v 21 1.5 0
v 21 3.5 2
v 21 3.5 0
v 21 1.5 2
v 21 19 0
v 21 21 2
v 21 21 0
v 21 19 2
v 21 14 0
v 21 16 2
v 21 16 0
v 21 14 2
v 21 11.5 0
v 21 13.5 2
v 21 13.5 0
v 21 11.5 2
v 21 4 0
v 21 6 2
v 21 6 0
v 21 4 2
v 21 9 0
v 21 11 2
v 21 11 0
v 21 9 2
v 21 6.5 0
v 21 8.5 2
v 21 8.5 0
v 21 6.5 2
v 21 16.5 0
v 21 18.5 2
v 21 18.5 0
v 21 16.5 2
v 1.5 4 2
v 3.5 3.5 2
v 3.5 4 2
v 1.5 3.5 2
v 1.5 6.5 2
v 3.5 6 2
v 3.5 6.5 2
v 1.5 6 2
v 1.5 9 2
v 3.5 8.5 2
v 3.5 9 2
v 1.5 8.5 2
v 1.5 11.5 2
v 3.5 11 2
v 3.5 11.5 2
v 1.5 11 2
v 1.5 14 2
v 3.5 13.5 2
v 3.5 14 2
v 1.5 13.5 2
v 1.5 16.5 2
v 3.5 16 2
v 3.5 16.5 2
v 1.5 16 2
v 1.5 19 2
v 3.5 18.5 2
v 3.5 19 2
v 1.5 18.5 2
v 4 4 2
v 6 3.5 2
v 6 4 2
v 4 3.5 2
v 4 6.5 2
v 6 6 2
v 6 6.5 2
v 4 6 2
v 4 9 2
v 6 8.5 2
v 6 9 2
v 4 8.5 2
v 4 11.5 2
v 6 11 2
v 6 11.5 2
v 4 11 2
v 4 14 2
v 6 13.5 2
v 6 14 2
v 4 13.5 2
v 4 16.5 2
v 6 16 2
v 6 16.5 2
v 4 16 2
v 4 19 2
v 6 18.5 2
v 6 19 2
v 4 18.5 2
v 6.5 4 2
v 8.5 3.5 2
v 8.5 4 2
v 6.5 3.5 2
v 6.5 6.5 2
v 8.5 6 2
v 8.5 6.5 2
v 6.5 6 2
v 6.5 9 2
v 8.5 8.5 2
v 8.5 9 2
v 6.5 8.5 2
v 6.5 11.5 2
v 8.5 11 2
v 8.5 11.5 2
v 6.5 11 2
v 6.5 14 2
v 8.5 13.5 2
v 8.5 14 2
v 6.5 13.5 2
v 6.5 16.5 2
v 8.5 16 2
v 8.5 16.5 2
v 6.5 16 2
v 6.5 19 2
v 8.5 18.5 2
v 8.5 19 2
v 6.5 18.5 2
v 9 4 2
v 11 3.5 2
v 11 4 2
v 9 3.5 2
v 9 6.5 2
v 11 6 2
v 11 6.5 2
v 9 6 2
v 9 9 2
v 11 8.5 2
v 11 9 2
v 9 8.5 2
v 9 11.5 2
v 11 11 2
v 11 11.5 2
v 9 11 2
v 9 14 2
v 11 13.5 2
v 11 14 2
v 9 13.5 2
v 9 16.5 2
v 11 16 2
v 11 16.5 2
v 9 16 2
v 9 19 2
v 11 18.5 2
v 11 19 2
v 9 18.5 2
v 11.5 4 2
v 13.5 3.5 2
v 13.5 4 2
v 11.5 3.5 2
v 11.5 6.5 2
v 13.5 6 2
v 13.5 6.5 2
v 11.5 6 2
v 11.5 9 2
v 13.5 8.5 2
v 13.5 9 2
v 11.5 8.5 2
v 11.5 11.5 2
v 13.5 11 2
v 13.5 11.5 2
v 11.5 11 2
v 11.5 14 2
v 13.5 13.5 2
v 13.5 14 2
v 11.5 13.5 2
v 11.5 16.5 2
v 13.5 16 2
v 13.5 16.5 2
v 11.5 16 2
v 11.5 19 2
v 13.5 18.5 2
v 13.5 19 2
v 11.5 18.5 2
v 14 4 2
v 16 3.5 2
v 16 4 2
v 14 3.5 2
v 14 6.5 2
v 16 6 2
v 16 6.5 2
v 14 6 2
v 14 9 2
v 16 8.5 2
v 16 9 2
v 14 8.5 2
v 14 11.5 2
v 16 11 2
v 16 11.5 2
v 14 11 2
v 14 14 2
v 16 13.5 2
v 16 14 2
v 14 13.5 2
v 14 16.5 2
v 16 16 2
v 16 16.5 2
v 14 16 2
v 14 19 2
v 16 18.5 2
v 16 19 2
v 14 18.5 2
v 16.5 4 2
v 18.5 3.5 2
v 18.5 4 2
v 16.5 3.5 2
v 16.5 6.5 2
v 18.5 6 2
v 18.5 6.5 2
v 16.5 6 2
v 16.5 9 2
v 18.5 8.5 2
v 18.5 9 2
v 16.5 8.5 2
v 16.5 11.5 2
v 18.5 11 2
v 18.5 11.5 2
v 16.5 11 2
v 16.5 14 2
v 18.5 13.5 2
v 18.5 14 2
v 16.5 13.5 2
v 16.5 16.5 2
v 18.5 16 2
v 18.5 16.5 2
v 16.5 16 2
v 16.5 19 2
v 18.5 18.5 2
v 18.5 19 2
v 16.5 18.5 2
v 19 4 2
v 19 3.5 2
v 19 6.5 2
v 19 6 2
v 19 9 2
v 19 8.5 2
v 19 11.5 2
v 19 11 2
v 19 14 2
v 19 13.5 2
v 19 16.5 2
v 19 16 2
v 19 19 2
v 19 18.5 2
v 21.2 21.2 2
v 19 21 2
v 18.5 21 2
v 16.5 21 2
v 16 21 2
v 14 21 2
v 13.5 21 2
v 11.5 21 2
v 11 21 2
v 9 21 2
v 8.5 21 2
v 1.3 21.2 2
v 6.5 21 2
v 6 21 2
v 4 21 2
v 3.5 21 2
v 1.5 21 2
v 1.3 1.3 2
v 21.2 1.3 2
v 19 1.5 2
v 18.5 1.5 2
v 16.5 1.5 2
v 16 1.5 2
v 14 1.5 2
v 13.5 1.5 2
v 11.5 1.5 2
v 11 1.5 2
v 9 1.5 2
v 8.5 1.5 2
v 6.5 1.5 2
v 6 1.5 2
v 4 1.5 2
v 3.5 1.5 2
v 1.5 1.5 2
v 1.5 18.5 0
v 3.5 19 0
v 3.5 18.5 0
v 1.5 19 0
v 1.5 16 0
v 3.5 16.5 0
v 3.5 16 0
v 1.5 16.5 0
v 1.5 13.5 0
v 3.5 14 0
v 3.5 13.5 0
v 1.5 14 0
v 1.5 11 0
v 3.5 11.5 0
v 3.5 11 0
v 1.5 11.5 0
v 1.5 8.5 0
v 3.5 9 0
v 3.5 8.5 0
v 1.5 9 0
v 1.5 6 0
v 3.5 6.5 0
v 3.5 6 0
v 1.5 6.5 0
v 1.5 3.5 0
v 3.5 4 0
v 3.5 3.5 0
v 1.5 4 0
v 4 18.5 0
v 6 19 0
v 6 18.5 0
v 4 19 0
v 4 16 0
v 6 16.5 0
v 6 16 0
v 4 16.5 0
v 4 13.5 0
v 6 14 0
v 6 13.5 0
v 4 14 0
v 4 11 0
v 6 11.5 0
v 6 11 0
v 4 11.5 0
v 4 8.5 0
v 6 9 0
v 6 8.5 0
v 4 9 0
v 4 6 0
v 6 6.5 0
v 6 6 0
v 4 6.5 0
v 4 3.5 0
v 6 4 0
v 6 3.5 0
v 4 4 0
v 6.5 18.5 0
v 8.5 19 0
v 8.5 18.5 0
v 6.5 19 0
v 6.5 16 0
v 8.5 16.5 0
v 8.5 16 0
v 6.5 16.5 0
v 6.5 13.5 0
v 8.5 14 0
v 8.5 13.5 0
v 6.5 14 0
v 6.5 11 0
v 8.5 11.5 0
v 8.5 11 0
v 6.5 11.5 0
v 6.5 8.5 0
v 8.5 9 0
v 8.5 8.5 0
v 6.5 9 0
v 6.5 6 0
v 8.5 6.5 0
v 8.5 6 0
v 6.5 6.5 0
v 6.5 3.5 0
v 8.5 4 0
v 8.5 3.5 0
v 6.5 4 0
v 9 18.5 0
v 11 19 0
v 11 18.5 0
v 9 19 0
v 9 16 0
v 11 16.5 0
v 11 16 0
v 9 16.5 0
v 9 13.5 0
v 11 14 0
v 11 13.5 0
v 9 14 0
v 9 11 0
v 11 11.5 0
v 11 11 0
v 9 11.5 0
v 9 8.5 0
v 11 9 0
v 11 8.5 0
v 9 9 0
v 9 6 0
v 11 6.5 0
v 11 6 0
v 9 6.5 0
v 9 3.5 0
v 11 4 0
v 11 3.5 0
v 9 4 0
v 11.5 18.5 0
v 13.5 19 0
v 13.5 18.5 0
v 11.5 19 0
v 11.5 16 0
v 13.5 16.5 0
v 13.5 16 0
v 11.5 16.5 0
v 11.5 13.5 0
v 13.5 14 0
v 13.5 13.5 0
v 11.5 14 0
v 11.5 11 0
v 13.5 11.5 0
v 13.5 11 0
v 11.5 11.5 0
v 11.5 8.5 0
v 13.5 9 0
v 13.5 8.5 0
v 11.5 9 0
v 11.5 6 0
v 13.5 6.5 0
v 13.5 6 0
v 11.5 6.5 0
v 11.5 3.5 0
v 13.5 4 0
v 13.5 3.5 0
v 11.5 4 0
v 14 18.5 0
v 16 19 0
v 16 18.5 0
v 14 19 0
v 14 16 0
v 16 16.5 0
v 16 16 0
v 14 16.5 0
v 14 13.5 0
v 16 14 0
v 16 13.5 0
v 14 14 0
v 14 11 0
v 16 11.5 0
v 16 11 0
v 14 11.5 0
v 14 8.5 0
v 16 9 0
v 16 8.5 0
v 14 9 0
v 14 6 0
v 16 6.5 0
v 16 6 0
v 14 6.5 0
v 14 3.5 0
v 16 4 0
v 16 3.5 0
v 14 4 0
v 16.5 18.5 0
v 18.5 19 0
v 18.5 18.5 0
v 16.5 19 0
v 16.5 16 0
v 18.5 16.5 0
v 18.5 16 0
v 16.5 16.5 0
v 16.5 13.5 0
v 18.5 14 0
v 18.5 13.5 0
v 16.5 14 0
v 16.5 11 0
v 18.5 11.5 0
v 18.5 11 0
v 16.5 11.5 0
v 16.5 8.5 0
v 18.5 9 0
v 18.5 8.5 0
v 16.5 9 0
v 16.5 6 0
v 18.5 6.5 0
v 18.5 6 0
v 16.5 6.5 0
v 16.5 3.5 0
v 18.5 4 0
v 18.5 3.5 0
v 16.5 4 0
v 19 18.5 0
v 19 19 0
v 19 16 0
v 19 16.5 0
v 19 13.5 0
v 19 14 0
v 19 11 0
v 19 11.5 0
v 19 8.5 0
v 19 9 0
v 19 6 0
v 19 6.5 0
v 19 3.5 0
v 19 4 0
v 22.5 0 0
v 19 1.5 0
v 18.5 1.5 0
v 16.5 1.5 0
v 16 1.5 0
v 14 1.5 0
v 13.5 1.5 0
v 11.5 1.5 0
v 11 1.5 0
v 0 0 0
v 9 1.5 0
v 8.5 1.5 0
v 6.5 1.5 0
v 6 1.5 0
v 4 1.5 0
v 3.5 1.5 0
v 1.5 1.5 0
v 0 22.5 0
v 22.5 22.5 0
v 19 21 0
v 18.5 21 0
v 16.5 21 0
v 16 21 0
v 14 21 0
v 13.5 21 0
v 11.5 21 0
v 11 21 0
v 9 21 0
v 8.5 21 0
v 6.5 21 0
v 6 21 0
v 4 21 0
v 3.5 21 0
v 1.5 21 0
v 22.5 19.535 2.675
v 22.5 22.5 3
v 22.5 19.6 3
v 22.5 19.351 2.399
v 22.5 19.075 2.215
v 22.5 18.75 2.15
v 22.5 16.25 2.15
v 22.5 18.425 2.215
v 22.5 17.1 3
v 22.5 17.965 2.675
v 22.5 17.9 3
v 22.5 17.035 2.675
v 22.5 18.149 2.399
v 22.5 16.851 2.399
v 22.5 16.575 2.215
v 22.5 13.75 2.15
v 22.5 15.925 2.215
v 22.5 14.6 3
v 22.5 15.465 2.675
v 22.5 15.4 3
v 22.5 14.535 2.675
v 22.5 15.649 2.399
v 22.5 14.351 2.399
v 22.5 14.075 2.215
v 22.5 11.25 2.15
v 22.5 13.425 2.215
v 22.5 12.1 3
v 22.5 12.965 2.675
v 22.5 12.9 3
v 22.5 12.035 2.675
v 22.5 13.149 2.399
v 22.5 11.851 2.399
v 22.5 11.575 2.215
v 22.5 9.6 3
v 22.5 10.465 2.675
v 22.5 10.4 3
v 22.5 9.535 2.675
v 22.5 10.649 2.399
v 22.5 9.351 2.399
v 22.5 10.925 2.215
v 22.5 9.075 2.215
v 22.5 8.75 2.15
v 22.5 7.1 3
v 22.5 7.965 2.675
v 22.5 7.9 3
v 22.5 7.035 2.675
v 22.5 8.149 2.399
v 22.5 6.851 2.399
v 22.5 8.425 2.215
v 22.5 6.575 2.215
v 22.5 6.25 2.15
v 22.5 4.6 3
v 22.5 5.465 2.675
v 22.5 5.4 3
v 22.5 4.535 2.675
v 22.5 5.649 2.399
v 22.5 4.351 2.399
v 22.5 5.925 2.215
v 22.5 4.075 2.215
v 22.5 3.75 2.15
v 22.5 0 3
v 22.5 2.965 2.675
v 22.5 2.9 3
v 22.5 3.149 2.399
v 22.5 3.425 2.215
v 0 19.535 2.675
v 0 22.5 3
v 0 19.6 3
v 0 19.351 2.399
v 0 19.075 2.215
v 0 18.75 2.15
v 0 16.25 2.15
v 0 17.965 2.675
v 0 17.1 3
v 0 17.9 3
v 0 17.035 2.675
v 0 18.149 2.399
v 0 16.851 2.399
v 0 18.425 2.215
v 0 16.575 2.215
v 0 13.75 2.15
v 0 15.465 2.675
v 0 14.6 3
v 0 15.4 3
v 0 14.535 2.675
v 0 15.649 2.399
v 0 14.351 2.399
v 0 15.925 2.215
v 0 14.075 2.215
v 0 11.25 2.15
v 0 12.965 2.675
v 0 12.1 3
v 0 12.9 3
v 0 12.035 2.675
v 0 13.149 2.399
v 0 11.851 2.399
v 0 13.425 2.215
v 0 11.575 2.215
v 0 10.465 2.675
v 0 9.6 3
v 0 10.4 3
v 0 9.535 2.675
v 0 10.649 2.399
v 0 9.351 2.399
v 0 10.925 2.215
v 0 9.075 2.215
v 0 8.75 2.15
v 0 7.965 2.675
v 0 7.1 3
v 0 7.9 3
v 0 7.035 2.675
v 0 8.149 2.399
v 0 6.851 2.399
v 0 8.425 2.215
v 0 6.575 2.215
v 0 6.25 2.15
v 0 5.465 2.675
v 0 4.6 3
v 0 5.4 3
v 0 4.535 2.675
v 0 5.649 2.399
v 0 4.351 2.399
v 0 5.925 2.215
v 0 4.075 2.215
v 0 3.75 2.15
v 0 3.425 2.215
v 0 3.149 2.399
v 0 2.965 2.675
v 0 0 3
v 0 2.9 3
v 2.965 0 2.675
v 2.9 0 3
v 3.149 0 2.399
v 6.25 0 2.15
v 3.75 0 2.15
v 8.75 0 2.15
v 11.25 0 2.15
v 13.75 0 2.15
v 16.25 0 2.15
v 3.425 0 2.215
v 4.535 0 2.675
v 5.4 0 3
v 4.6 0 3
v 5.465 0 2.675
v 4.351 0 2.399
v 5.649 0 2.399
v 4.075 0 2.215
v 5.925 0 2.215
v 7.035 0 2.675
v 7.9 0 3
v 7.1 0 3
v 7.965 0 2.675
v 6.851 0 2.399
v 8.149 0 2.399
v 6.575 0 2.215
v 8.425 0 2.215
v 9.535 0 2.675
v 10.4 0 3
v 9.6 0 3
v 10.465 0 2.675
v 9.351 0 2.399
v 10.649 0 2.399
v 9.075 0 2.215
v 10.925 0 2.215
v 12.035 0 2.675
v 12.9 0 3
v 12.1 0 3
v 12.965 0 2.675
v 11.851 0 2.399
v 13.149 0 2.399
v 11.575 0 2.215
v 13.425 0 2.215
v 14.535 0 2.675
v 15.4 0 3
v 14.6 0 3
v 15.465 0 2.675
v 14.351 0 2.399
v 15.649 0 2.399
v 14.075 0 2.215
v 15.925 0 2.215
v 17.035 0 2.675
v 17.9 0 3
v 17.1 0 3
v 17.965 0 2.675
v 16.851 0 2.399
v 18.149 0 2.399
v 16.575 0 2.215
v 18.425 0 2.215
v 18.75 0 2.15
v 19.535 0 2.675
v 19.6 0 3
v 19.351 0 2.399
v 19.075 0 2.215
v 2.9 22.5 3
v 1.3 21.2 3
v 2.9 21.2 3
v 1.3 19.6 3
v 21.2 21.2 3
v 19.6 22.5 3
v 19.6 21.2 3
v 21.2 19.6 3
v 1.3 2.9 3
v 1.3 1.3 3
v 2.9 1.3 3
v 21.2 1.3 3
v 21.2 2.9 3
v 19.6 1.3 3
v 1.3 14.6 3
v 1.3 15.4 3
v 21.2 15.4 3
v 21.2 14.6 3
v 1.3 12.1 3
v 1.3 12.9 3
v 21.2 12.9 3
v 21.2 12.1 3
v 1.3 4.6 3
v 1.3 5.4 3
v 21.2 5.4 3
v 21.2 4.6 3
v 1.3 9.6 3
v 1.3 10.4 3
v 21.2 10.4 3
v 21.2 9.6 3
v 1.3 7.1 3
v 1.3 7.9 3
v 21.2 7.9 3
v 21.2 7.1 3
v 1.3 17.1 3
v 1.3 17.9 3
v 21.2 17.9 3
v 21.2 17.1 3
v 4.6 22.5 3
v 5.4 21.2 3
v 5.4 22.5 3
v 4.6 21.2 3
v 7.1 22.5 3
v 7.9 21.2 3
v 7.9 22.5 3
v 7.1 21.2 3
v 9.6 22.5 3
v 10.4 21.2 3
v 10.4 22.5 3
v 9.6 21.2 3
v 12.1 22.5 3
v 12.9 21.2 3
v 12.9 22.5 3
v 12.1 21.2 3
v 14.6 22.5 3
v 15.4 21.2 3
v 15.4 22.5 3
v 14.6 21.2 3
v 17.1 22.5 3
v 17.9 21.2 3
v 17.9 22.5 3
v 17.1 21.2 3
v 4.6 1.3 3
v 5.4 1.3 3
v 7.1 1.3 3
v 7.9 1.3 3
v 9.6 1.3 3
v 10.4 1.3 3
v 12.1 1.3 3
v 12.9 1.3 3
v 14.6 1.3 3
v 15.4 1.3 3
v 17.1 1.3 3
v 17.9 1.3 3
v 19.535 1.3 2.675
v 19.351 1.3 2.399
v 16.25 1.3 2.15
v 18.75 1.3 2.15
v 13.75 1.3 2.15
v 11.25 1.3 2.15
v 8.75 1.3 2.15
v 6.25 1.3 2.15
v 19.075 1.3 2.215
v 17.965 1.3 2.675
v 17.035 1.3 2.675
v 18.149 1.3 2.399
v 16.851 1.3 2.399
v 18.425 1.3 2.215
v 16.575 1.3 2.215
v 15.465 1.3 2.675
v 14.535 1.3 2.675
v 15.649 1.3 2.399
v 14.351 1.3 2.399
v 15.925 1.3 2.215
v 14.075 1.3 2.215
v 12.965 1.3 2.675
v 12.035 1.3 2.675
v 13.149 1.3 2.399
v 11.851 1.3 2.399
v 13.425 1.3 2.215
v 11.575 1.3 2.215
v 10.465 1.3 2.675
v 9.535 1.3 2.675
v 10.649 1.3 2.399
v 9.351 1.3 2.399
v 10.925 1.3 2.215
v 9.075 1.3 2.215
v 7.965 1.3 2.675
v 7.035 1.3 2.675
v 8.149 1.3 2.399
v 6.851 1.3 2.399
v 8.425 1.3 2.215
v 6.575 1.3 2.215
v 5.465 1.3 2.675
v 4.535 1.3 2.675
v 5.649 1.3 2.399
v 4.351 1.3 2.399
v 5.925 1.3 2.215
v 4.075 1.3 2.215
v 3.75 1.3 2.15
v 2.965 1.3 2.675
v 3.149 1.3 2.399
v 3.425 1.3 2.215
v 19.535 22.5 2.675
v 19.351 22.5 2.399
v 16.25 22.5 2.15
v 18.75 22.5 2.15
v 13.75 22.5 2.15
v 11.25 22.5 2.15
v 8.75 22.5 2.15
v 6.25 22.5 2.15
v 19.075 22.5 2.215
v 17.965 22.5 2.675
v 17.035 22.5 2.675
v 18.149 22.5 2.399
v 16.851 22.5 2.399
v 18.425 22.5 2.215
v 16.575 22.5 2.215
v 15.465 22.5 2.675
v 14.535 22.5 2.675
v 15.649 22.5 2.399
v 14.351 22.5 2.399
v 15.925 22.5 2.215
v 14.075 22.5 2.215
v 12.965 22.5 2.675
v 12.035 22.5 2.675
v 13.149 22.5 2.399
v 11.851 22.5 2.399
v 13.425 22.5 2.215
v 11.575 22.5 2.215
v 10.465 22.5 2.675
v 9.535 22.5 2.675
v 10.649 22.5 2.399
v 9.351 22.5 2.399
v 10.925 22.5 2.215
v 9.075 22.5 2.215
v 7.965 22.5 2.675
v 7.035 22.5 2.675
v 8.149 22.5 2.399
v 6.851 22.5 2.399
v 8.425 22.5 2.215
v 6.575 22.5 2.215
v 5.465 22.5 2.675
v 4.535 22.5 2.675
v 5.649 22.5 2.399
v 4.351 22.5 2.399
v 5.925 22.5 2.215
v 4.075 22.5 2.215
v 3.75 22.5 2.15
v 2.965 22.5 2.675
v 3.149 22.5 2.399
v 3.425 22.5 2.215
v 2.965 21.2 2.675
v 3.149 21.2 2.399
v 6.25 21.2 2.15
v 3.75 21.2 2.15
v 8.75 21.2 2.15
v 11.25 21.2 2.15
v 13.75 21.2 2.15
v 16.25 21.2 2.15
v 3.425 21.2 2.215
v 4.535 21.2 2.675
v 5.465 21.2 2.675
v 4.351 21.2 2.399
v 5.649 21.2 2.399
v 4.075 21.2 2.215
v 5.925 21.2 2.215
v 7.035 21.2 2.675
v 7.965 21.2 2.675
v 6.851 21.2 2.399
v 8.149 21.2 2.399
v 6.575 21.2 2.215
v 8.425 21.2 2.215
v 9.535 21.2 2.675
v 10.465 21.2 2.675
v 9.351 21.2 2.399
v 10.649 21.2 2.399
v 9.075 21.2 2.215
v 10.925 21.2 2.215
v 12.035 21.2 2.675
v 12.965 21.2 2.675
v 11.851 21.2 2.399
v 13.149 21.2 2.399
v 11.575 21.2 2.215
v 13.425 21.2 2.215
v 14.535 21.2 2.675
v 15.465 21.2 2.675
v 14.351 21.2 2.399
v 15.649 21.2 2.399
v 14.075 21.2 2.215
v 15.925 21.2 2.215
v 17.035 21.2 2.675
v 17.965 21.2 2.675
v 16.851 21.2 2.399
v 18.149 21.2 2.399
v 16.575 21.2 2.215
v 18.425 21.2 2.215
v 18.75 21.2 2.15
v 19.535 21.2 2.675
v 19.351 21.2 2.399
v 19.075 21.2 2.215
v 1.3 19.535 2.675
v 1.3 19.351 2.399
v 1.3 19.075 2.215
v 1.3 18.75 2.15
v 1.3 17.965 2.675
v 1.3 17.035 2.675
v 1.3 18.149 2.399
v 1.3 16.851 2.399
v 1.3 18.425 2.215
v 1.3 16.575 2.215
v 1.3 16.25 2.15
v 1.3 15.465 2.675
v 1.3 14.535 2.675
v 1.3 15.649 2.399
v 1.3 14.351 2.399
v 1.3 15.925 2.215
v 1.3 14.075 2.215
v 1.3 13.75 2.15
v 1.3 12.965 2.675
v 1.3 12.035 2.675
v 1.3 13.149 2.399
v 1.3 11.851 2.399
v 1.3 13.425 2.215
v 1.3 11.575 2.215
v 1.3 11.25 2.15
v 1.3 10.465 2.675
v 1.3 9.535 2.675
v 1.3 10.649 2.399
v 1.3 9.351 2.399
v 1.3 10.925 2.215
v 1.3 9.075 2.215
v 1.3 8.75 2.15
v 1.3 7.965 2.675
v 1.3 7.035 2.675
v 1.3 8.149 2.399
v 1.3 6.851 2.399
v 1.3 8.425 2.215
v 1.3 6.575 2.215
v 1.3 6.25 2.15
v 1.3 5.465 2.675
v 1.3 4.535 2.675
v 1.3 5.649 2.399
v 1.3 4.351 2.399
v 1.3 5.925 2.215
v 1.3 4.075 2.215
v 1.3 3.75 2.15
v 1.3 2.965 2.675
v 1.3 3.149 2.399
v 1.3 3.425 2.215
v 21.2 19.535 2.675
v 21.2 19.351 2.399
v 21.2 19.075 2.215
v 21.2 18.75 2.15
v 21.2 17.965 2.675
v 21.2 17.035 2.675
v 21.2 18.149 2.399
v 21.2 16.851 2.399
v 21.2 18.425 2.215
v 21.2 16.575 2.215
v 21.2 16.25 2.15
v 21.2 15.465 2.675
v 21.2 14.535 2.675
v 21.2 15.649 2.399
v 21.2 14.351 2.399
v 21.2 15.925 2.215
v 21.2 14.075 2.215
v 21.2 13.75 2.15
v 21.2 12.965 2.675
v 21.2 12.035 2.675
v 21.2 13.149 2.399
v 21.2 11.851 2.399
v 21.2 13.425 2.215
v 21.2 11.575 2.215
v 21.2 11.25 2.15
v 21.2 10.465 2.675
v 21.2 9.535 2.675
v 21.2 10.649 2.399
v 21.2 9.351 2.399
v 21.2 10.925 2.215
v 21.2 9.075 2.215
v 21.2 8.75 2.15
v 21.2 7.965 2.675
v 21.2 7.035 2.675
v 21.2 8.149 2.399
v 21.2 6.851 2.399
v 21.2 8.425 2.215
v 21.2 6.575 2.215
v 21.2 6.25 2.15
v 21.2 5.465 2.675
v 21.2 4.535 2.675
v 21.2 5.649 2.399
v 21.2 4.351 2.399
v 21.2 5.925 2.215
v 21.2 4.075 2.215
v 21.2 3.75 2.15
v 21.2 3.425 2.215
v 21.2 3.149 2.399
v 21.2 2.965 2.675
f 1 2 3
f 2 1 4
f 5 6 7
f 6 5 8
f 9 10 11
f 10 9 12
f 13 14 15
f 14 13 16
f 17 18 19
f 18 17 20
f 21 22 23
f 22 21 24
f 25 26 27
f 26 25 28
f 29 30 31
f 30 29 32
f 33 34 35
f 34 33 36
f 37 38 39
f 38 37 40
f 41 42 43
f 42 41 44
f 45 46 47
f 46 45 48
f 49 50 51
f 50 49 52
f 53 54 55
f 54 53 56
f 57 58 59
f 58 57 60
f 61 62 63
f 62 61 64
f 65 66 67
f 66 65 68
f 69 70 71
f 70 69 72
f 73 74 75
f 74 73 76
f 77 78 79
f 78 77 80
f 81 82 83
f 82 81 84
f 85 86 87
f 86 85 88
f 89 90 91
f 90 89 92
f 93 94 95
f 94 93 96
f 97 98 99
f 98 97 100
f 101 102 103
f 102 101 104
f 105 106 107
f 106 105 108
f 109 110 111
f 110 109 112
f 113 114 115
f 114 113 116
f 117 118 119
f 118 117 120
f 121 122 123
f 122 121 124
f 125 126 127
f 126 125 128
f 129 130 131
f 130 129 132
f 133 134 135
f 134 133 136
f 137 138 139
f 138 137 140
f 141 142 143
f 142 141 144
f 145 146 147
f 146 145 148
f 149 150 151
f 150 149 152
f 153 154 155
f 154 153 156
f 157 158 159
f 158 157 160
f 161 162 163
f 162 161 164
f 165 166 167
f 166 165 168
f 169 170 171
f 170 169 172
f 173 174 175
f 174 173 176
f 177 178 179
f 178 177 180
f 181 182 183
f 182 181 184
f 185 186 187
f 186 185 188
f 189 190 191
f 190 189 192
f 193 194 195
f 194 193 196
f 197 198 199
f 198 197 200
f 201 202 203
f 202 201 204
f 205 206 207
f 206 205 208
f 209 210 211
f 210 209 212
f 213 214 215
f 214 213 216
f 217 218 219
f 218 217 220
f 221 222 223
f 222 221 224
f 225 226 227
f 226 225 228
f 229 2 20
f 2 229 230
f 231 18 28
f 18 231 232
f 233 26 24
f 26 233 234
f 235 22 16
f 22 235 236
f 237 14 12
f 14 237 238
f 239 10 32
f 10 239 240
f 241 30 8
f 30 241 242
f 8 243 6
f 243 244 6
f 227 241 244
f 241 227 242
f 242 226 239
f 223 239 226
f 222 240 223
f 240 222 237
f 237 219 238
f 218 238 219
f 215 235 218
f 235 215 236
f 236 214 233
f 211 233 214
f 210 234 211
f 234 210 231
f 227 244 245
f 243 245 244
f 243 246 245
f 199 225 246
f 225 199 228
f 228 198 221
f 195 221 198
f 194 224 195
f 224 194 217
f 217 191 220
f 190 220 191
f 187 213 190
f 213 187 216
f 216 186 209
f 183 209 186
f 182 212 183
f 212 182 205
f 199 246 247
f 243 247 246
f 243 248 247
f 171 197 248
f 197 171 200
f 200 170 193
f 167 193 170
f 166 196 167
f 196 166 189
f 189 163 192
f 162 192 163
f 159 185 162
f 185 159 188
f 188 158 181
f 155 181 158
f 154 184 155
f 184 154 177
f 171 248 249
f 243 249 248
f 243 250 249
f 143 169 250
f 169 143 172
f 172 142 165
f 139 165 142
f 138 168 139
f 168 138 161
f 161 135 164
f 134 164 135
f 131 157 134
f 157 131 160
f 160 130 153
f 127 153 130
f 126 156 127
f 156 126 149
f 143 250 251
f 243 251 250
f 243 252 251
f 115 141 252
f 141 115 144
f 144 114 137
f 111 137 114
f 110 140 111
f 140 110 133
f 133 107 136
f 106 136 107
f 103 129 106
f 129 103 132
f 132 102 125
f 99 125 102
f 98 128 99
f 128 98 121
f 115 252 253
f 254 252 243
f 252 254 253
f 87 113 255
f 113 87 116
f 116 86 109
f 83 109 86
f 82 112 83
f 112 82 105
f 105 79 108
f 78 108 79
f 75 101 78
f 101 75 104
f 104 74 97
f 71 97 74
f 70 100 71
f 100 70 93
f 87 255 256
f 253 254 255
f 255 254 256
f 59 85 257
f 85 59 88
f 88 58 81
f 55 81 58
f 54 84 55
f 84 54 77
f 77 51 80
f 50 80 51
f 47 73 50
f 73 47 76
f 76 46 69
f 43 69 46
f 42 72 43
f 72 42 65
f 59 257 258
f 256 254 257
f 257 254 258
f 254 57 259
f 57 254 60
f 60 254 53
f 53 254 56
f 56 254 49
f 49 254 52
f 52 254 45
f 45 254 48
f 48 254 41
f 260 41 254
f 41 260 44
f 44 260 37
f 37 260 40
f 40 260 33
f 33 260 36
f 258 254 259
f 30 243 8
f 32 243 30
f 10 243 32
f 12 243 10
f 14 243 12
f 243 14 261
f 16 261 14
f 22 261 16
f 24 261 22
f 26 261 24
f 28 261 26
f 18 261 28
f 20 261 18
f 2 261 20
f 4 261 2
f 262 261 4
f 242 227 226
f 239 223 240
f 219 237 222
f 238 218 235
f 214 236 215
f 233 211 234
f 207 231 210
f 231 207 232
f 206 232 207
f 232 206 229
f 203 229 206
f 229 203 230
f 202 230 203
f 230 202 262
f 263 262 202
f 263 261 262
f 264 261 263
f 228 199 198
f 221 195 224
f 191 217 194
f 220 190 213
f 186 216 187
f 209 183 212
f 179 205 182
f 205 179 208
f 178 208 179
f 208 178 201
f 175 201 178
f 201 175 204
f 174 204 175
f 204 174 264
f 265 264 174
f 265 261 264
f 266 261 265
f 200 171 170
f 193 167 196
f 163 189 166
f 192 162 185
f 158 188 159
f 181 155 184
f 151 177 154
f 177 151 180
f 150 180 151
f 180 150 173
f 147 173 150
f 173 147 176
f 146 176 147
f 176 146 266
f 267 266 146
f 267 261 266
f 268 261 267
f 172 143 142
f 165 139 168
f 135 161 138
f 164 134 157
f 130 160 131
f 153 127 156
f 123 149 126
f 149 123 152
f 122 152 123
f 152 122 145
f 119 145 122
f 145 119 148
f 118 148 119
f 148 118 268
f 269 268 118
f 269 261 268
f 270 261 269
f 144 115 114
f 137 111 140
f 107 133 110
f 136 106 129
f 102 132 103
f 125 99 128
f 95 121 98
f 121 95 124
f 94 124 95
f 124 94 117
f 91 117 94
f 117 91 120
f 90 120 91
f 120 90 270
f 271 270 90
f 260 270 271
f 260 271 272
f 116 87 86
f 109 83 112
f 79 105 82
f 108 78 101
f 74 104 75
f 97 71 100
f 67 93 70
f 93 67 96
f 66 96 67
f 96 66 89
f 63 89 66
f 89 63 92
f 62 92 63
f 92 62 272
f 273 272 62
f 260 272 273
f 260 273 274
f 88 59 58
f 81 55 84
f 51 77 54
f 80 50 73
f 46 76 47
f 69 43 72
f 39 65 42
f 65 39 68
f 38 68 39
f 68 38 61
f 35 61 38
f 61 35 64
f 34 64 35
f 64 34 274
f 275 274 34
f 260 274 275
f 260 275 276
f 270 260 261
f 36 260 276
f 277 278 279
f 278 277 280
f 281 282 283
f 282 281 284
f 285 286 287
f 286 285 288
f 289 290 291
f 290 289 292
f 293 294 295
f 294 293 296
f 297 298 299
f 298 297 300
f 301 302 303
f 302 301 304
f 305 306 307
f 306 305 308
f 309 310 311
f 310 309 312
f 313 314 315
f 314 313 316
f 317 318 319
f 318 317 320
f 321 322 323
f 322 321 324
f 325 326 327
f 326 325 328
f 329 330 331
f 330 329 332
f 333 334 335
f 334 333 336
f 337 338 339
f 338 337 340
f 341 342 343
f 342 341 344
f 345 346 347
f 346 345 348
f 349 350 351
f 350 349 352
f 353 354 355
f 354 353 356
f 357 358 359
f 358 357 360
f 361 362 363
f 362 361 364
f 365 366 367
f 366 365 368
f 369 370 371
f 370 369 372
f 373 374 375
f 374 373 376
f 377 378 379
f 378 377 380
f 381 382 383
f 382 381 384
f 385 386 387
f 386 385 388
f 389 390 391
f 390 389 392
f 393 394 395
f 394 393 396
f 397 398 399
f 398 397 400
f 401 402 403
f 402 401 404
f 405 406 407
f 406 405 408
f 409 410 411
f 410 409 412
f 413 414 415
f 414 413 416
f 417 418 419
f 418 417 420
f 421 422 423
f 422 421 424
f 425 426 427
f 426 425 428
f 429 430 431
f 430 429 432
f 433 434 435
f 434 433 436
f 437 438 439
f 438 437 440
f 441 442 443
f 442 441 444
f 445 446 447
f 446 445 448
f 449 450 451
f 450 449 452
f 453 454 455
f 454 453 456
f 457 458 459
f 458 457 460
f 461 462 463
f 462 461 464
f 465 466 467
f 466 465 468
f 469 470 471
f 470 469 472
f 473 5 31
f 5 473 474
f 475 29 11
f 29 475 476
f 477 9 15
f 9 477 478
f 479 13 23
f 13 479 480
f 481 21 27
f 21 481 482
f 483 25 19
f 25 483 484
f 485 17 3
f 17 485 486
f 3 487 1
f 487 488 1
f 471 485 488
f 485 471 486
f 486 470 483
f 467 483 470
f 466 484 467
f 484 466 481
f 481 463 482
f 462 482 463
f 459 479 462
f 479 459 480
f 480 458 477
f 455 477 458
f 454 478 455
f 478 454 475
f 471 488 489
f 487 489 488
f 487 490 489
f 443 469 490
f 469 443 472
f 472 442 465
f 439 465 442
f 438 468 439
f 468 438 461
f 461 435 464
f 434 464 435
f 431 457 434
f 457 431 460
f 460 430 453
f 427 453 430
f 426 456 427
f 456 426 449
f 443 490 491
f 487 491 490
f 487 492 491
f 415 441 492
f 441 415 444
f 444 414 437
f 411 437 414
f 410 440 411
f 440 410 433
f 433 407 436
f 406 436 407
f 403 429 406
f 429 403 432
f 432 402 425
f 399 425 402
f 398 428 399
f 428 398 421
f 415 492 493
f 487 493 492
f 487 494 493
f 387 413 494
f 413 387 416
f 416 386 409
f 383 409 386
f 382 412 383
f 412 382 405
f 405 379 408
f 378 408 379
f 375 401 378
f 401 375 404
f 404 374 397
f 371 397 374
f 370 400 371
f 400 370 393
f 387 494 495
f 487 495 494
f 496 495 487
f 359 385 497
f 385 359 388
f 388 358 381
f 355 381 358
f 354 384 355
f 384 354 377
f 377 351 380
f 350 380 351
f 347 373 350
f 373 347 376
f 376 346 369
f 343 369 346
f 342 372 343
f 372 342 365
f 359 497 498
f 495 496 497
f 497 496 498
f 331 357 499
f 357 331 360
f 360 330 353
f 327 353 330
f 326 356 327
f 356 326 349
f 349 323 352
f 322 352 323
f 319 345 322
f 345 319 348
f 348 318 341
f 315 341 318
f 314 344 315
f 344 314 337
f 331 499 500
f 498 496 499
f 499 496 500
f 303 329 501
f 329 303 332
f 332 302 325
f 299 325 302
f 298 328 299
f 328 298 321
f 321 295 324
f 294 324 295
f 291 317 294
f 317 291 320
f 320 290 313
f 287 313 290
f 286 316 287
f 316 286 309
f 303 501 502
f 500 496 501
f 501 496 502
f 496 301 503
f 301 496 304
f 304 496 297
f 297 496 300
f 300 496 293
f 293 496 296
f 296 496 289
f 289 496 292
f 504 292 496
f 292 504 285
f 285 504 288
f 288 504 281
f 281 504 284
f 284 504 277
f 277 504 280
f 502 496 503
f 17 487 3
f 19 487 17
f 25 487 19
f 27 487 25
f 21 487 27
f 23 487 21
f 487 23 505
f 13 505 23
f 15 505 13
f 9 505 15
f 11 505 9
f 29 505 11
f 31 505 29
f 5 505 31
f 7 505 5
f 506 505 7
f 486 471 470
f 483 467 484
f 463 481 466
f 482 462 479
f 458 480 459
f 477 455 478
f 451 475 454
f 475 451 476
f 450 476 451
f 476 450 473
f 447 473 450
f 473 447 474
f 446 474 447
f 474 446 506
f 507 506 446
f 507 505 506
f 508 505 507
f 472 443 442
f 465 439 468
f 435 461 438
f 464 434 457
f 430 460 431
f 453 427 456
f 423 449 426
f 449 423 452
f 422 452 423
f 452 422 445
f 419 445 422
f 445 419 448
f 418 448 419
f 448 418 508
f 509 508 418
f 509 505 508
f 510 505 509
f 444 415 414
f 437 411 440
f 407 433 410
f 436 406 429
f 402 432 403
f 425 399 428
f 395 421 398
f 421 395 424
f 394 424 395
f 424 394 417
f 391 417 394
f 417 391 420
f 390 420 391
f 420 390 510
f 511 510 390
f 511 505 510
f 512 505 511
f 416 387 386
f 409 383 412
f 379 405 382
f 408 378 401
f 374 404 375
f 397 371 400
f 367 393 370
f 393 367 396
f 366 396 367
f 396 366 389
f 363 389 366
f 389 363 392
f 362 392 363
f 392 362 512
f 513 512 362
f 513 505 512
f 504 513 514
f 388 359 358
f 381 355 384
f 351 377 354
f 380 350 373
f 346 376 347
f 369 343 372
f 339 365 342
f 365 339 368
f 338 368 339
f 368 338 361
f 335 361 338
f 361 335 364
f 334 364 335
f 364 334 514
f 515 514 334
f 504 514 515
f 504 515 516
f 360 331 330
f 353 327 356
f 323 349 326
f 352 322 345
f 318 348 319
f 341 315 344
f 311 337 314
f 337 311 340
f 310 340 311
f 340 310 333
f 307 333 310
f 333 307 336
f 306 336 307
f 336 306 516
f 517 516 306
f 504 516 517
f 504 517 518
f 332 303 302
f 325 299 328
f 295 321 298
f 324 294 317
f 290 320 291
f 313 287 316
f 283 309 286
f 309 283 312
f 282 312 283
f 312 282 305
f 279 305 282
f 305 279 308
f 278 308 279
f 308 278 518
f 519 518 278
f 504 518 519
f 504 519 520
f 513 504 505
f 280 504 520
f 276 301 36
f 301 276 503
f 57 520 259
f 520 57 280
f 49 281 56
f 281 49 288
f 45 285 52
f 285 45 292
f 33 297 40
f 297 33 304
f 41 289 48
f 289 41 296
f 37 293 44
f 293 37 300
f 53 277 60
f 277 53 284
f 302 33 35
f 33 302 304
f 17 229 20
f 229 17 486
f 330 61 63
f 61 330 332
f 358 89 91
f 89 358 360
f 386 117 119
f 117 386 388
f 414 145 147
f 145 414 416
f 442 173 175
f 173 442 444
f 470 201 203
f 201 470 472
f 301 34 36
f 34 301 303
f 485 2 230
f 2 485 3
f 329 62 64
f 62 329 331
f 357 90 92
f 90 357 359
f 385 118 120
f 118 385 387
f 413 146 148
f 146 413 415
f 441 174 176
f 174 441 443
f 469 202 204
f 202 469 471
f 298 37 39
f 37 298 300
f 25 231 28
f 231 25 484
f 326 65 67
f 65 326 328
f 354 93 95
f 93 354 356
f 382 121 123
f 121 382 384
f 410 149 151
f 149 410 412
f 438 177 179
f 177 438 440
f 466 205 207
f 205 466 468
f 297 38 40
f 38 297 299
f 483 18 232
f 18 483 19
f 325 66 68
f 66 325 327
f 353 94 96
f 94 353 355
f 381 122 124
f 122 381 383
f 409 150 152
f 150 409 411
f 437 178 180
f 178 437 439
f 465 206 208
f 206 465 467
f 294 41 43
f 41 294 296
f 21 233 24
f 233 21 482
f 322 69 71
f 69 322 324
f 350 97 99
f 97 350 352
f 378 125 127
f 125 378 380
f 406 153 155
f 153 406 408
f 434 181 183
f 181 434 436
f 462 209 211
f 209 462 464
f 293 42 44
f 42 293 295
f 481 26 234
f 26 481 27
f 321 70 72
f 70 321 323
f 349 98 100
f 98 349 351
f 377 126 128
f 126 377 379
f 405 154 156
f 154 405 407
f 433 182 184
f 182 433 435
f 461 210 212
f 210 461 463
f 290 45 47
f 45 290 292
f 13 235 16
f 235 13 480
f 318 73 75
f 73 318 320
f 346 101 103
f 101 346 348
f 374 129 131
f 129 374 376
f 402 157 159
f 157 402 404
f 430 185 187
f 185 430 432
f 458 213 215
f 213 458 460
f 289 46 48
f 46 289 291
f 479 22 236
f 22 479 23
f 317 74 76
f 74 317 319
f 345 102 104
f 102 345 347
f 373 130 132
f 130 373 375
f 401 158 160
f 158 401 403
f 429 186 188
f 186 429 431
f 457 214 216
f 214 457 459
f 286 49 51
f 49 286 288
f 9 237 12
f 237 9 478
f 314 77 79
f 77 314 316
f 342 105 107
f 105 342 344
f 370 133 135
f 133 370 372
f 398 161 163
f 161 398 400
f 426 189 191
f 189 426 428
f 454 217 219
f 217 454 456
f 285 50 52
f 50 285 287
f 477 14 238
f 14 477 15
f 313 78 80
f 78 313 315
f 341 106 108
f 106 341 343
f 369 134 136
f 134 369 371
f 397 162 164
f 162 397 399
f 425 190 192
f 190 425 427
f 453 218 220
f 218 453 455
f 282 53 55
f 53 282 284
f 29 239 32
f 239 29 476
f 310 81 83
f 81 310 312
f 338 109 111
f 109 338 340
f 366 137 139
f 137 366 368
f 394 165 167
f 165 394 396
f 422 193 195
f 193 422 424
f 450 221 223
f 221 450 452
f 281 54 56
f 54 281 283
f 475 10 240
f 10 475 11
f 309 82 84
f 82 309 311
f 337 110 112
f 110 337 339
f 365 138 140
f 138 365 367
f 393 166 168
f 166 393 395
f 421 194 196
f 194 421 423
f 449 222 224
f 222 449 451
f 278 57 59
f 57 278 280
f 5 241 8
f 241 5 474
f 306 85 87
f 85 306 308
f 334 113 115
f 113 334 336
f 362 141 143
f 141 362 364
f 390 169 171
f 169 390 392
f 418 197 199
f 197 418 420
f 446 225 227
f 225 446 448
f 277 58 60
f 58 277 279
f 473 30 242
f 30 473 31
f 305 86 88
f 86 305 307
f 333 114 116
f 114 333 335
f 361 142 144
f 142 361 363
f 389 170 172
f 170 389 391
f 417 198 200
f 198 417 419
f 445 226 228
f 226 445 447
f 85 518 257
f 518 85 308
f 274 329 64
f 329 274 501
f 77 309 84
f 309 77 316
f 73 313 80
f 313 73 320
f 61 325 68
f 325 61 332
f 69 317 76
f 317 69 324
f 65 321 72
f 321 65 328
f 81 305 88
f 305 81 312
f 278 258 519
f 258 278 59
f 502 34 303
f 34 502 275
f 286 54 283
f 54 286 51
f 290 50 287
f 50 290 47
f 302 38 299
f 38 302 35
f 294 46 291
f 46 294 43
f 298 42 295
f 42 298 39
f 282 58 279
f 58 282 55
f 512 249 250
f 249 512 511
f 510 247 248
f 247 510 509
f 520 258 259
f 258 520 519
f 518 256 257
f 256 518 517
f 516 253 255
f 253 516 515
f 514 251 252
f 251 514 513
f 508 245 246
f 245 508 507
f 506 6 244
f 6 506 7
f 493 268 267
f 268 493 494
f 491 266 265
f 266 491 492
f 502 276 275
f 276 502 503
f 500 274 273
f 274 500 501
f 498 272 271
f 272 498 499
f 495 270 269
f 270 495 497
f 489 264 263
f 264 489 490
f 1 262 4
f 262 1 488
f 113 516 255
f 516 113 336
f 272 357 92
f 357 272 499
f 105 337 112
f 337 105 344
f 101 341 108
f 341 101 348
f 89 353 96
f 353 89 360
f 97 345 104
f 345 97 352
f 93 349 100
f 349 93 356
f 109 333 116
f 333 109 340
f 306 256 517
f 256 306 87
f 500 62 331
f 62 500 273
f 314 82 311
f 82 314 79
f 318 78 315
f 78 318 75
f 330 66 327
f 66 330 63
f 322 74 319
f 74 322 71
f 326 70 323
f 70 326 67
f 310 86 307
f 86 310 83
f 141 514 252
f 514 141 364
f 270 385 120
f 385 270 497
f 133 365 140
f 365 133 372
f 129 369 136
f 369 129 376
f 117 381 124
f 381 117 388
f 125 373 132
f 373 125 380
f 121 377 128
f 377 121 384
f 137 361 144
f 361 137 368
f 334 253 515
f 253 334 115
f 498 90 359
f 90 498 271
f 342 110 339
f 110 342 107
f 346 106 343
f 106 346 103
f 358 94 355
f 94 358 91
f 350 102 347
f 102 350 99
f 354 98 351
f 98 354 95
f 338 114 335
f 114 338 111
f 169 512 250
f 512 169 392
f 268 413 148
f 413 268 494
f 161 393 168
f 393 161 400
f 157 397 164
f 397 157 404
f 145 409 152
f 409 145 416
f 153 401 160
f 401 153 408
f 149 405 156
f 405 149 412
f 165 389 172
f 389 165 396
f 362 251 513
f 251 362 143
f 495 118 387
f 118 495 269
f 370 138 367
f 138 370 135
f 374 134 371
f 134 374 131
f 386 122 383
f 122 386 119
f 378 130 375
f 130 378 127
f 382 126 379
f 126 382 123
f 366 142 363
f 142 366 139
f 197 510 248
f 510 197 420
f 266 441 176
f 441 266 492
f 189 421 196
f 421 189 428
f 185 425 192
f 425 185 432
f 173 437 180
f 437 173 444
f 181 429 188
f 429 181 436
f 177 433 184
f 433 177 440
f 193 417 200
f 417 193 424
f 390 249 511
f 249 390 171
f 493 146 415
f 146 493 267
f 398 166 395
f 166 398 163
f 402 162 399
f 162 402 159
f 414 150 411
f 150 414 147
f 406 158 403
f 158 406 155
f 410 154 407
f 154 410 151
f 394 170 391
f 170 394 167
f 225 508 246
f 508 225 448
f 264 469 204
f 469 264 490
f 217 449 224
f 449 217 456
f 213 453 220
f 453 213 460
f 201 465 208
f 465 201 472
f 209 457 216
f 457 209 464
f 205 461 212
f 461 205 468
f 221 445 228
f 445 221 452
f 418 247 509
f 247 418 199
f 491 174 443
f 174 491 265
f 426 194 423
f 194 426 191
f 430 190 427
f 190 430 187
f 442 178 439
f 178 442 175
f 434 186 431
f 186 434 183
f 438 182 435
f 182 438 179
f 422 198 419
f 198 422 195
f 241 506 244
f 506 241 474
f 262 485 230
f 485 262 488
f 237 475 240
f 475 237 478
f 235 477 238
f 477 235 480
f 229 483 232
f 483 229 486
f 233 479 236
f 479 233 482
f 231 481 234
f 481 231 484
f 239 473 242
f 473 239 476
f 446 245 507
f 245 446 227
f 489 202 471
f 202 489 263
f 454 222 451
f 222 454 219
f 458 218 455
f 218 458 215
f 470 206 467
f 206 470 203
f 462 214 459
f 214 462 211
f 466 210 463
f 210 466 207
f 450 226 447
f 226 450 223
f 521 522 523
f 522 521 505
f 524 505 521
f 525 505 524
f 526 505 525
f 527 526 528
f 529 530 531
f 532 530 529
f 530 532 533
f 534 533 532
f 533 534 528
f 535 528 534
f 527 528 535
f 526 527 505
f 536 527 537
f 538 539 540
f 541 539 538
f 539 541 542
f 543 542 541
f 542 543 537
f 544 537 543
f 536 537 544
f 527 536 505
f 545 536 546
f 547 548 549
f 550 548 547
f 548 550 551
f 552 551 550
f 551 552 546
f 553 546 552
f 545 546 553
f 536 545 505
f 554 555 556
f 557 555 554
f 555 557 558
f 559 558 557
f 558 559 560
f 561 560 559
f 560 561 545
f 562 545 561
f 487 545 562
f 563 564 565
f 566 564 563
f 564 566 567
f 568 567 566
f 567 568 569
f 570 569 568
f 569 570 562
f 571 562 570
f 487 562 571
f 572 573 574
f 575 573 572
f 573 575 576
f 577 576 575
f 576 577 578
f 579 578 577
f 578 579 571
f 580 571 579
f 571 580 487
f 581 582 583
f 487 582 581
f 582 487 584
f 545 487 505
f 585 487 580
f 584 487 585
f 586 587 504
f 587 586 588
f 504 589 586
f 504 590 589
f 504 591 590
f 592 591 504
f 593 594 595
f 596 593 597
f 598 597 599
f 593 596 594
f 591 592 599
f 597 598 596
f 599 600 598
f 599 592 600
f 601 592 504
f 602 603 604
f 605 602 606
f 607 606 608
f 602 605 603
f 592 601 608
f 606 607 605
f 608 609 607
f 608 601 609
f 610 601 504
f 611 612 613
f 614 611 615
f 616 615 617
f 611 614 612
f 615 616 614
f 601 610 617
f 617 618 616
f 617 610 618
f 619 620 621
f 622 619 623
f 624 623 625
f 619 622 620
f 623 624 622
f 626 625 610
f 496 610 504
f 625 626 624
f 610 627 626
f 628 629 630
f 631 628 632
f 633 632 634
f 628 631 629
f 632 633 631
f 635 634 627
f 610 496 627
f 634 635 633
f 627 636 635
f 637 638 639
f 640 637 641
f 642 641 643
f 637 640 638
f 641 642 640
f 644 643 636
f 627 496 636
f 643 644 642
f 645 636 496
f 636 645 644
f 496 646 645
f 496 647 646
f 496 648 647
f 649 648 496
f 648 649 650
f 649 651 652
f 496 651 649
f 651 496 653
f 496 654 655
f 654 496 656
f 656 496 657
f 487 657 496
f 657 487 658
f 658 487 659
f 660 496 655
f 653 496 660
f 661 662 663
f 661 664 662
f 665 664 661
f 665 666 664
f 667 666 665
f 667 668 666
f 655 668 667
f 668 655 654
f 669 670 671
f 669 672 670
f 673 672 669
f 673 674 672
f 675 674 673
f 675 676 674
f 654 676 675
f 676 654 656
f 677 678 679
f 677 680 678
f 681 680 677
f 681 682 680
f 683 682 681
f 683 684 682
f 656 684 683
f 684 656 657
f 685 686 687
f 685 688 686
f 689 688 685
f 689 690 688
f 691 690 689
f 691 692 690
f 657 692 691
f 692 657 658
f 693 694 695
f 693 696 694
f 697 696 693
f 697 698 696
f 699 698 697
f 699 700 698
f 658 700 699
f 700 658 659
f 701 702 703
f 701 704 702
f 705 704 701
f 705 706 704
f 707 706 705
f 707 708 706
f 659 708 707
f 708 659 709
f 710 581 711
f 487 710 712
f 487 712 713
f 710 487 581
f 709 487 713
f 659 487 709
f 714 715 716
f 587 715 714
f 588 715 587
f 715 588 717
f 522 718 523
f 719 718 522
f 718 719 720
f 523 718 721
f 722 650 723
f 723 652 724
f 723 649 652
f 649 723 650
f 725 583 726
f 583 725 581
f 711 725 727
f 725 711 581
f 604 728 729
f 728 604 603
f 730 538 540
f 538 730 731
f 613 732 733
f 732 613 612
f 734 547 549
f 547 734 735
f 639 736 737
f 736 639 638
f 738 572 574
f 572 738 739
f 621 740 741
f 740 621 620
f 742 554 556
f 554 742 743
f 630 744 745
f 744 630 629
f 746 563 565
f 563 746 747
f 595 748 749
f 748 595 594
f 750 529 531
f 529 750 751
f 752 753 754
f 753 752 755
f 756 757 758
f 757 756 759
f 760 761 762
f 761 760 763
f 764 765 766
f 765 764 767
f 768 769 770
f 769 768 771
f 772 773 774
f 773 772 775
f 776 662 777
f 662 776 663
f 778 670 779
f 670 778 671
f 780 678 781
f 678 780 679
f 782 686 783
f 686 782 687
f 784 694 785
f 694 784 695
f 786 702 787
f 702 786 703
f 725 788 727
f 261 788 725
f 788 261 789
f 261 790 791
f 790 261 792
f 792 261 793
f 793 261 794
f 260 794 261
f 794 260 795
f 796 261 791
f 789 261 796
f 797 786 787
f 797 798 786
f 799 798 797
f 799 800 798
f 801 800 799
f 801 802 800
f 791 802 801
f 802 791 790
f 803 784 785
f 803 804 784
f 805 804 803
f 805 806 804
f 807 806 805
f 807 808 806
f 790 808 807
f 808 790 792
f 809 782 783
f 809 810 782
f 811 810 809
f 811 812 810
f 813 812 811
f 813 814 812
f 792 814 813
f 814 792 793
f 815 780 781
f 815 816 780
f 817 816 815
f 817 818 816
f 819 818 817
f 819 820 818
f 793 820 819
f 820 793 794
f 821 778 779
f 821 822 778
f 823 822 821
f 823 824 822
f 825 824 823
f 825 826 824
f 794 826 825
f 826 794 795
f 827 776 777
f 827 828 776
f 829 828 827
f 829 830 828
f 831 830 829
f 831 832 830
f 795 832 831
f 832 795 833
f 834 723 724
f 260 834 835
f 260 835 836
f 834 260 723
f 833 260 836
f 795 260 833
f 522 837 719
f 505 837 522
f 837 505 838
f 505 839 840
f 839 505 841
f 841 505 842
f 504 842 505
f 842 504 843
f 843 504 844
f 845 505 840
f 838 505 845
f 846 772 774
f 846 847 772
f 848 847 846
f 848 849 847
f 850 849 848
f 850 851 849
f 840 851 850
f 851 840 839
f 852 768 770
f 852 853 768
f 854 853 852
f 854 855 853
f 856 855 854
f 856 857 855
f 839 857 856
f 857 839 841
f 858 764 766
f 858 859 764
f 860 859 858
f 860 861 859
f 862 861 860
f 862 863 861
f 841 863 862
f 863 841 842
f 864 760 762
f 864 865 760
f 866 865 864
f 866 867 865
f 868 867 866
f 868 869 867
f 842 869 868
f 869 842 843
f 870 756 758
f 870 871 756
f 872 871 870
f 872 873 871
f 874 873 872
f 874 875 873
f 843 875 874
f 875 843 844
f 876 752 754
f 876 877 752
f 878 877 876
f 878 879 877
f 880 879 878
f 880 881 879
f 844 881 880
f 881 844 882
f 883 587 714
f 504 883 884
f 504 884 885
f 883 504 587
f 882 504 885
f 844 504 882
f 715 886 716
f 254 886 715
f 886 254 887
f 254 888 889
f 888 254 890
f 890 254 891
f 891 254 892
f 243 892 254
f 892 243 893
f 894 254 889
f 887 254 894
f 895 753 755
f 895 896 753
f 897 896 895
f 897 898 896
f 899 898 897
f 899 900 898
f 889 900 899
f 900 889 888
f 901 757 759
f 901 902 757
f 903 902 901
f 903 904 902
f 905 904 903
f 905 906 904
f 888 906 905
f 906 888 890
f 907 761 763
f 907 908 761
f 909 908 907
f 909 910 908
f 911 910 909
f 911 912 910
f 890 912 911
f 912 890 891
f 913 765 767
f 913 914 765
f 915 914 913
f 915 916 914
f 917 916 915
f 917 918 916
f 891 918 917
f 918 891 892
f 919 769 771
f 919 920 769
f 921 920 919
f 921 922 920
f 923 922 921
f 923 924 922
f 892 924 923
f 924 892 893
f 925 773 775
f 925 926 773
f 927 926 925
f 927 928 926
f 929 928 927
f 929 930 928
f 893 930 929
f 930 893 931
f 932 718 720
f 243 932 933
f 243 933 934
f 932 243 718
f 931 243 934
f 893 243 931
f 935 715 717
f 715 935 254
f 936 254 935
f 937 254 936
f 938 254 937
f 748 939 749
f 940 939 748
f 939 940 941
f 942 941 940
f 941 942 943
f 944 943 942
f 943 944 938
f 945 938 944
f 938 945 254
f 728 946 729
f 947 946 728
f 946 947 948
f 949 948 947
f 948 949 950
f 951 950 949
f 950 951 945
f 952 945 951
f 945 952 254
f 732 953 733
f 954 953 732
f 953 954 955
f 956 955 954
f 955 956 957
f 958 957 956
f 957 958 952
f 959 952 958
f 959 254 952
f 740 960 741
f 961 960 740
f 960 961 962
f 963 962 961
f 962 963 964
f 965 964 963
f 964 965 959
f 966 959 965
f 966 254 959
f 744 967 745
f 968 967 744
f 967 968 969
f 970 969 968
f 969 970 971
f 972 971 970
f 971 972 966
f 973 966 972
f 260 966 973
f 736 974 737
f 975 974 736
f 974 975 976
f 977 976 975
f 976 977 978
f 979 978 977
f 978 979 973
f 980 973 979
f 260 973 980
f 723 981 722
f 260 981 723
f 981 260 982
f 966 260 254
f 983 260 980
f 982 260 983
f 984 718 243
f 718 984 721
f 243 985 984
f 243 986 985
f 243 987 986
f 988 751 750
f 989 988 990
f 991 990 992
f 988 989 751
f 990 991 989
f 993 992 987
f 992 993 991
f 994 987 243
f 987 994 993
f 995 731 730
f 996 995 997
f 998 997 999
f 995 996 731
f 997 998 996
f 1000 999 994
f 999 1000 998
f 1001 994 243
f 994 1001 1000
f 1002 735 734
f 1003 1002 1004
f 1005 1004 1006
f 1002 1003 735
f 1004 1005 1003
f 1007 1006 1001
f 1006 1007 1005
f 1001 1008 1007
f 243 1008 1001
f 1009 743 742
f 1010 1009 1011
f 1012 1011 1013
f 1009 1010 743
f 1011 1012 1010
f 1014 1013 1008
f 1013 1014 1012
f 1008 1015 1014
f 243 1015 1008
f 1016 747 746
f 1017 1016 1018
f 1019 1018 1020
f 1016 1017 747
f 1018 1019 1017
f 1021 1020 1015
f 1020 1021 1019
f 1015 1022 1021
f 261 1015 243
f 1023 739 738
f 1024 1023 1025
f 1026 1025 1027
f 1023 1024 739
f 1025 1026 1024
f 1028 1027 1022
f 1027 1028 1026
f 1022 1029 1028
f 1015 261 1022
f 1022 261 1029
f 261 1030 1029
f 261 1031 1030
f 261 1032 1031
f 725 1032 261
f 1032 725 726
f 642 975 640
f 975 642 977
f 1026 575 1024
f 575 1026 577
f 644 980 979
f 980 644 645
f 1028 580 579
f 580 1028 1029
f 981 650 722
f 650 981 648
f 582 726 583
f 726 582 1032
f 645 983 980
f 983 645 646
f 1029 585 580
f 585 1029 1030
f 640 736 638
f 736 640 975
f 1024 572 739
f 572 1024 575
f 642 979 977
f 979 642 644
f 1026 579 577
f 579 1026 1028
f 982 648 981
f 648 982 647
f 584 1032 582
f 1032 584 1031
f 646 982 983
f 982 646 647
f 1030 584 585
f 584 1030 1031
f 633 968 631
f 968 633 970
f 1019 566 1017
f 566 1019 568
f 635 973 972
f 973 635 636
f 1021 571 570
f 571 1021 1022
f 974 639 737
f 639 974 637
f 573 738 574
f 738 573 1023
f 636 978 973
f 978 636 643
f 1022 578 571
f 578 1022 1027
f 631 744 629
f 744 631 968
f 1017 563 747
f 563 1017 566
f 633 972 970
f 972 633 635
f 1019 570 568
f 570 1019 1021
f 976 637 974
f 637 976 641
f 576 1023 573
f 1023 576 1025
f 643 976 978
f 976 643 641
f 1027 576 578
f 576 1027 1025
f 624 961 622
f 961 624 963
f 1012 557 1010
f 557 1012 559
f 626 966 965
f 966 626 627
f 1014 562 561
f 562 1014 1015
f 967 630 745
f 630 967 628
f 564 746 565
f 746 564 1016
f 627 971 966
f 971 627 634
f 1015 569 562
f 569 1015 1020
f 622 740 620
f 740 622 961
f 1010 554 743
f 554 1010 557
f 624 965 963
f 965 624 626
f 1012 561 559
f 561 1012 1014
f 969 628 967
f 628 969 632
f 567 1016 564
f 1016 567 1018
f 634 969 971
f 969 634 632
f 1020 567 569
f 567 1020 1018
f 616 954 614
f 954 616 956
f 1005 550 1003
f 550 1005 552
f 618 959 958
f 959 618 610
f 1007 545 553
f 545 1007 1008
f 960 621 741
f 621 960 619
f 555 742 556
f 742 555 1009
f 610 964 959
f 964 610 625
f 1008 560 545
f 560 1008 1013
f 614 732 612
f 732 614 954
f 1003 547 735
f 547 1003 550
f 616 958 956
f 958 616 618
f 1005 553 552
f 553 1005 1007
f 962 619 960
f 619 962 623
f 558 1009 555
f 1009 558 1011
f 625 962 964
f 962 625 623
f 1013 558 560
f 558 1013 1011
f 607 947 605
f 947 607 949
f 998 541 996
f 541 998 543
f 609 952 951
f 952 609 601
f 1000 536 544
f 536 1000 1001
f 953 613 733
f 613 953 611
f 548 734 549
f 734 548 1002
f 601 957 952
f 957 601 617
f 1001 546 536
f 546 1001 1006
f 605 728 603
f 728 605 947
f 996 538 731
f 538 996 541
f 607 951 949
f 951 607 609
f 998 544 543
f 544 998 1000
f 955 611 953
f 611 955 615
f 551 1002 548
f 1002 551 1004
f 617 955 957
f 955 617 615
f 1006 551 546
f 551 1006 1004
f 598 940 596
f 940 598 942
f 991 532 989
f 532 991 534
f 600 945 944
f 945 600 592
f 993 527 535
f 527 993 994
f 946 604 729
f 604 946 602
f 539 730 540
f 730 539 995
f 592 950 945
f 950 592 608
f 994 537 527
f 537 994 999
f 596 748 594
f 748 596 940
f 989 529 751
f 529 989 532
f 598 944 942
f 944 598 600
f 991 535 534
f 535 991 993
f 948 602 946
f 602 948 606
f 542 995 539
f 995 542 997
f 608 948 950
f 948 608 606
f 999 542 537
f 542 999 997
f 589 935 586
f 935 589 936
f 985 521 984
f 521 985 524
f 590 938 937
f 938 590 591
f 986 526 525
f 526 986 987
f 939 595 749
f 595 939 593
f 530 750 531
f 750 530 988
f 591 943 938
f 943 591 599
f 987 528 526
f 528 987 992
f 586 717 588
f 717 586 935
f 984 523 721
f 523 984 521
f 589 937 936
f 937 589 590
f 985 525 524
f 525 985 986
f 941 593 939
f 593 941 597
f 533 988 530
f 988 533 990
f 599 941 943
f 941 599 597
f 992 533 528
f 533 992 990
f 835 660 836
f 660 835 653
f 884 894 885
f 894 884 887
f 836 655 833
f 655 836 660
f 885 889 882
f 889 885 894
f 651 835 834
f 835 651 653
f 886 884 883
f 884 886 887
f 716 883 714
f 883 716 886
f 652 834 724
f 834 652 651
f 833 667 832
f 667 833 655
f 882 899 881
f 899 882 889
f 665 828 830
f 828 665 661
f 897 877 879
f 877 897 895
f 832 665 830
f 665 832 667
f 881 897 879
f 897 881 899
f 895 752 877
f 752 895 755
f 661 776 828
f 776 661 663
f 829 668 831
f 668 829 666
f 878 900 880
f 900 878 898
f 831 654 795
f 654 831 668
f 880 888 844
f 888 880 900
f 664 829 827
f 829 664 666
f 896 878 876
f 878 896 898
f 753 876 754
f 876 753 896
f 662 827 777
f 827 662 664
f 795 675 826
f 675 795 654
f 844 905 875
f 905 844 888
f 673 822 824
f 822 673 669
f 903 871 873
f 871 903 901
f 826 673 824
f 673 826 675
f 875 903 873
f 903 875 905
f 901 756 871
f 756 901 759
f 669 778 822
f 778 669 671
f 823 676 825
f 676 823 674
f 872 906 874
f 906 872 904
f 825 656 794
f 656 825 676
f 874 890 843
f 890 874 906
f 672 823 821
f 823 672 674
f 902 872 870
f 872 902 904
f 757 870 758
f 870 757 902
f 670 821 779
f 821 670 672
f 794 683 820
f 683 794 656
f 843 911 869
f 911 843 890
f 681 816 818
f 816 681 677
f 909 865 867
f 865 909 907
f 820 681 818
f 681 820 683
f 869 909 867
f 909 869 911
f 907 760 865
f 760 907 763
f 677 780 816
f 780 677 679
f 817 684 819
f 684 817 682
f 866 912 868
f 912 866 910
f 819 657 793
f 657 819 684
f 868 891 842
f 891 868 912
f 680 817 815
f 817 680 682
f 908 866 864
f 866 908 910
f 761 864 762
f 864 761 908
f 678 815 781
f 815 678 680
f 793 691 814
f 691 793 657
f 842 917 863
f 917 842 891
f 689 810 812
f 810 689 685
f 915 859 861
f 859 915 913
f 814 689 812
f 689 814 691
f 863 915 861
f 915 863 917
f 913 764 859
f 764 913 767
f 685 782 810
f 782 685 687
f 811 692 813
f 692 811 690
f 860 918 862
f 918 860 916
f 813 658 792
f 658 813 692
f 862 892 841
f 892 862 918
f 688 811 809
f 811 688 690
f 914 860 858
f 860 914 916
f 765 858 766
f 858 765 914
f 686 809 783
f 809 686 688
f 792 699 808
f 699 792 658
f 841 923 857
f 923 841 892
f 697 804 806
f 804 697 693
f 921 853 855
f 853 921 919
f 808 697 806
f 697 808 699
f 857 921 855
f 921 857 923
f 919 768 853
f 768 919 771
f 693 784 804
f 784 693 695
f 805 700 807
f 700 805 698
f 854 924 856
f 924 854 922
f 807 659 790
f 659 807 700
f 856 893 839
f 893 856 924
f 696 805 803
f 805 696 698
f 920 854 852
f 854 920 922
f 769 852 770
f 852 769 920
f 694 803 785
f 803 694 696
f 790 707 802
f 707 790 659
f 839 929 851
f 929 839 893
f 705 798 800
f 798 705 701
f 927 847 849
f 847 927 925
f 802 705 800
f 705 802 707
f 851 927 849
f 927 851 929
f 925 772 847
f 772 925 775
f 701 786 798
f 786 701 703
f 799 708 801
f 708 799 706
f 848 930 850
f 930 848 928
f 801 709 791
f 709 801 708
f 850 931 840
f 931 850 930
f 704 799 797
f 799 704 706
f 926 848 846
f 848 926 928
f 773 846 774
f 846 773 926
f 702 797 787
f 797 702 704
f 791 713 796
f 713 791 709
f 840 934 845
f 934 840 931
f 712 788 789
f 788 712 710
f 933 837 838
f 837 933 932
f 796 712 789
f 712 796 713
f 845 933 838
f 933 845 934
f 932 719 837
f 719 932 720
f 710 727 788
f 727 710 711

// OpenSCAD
grid_size_x = 8; // number of pixels on x
grid_size_y = 8; // number of pixels on y

cell_size = 2.5; // pitch between pixels
inner_wall_thickness = 0.5; // I think you get this one
outer_wall_thickness = 1.5; //this one too
inner_wall_height = 2; // minimum TBD by experimentation
outer_wall_height = inner_wall_height + 1;
pcb_tolerance = 0.2; //wiggle room for pcb

hole_size = 0.85; // size for solder joint holes

module grid() { // make readable code they said... 
  
    translate([0, 0, 0])
            cube([grid_size_y * cell_size - inner_wall_thickness + 2 * outer_wall_thickness, outer_wall_thickness, inner_wall_height]);
    translate([0, 0, inner_wall_height])
            cube([grid_size_y * cell_size - inner_wall_thickness + 2 * outer_wall_thickness, outer_wall_thickness - pcb_tolerance, outer_wall_height - inner_wall_height]);
    
    for (y = [1 : 1 : grid_size_x -1]) {
        translate([outer_wall_thickness, y * cell_size + outer_wall_thickness - inner_wall_thickness, 0])
            cube([grid_size_y * cell_size - inner_wall_thickness, inner_wall_thickness, inner_wall_height]);
    }
    
    translate([0, grid_size_x * cell_size + outer_wall_thickness - inner_wall_thickness, 0])
            cube([grid_size_y * cell_size - inner_wall_thickness + 2 * outer_wall_thickness, outer_wall_thickness, inner_wall_height]);
    translate([0, grid_size_x * cell_size + outer_wall_thickness - inner_wall_thickness + pcb_tolerance, inner_wall_height])
           cube([grid_size_y * cell_size - inner_wall_thickness + 2 * outer_wall_thickness, outer_wall_thickness - pcb_tolerance, outer_wall_height - inner_wall_height]);
    
    
    translate([0, 0, 0])
            cube([outer_wall_thickness, grid_size_x * cell_size - inner_wall_thickness + 2 * outer_wall_thickness, inner_wall_height]); 
    translate([0, 0, inner_wall_height])
            cube([outer_wall_thickness - pcb_tolerance, grid_size_x * cell_size - inner_wall_thickness + 2 * outer_wall_thickness, outer_wall_height - inner_wall_height]);
    
    for (x = [1 : 1 : grid_size_y - 1]) {
        translate([x * cell_size + outer_wall_thickness -inner_wall_thickness, outer_wall_thickness, 0])
            cube([inner_wall_thickness, grid_size_x * cell_size - inner_wall_thickness, inner_wall_height]);
    }
    
    translate([grid_size_y * cell_size + outer_wall_thickness - inner_wall_thickness, 0, 0])
            cube([outer_wall_thickness, grid_size_x * cell_size - inner_wall_thickness + 2 * outer_wall_thickness, inner_wall_height]);
    translate([grid_size_y * cell_size + outer_wall_thickness - inner_wall_thickness + pcb_tolerance, 0, inner_wall_height])
            cube([outer_wall_thickness - pcb_tolerance, grid_size_x * cell_size - inner_wall_thickness + 2 * outer_wall_thickness, outer_wall_height - inner_wall_height]);
}


 
 color([0.9,0.8,1]) difference() { //holes for soldering the module on a different pcb
     grid();
     for (y = [1 : 1 : grid_size_x -1]) {
        translate([-0.1, y * cell_size + outer_wall_thickness - inner_wall_thickness/2, outer_wall_height])
        rotate([0,90,0])
        cylinder(r=hole_size, h=cell_size * (grid_size_y + 2), $fn=16);
    }
    for (y = [1 : 1 : grid_size_y -1]) {
        translate([y * cell_size + outer_wall_thickness - inner_wall_thickness/2, -0.1, outer_wall_height])
        rotate([0,90,90])
        cylinder(r=hole_size, h=cell_size * (grid_size_y + 2), $fn=16);
    }
     
}
